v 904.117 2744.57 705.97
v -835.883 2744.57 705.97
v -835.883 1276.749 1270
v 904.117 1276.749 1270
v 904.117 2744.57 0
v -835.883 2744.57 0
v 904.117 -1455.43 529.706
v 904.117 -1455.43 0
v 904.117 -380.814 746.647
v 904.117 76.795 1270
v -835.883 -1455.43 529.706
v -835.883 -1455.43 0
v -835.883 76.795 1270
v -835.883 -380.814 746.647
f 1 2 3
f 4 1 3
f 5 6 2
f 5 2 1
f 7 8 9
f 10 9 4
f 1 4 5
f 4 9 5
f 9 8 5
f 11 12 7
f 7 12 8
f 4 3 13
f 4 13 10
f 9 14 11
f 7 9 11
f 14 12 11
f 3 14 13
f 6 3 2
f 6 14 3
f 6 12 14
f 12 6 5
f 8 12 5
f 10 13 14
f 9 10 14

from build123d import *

# Parameters (mm, degrees)
F0_W     = 1740
F0_H     = 4200
F1_DEPTH = 1270
F3_DEPTH = 1740


with BuildPart() as f1:
    # F0 (on Top) → F1 (new body)
    with BuildSketch(Plane.XY):
        with Locations((34.11721, 644.569875)):
            Rectangle(F0_W, F0_H)
    extrude(amount=F1_DEPTH)

    # F2 (on face) → F3 (cut, through all)
    with BuildSketch(Plane(origin=(-835.88279, 0, 0), x_dir=(0, -1, 0), z_dir=(-1, 0, 0))):
        Polygon((-2744.569875, 705.970407), (-1276.748896, 1270), (-2744.569875, 1270), align=None)
        Polygon((380.814463, 746.646821), (1455.430125, 529.706001), (1455.430125, 1270), (-76.795049, 1270), align=None)
    extrude(amount=-F3_DEPTH, mode=Mode.SUBTRACT)


solid = f1.part
